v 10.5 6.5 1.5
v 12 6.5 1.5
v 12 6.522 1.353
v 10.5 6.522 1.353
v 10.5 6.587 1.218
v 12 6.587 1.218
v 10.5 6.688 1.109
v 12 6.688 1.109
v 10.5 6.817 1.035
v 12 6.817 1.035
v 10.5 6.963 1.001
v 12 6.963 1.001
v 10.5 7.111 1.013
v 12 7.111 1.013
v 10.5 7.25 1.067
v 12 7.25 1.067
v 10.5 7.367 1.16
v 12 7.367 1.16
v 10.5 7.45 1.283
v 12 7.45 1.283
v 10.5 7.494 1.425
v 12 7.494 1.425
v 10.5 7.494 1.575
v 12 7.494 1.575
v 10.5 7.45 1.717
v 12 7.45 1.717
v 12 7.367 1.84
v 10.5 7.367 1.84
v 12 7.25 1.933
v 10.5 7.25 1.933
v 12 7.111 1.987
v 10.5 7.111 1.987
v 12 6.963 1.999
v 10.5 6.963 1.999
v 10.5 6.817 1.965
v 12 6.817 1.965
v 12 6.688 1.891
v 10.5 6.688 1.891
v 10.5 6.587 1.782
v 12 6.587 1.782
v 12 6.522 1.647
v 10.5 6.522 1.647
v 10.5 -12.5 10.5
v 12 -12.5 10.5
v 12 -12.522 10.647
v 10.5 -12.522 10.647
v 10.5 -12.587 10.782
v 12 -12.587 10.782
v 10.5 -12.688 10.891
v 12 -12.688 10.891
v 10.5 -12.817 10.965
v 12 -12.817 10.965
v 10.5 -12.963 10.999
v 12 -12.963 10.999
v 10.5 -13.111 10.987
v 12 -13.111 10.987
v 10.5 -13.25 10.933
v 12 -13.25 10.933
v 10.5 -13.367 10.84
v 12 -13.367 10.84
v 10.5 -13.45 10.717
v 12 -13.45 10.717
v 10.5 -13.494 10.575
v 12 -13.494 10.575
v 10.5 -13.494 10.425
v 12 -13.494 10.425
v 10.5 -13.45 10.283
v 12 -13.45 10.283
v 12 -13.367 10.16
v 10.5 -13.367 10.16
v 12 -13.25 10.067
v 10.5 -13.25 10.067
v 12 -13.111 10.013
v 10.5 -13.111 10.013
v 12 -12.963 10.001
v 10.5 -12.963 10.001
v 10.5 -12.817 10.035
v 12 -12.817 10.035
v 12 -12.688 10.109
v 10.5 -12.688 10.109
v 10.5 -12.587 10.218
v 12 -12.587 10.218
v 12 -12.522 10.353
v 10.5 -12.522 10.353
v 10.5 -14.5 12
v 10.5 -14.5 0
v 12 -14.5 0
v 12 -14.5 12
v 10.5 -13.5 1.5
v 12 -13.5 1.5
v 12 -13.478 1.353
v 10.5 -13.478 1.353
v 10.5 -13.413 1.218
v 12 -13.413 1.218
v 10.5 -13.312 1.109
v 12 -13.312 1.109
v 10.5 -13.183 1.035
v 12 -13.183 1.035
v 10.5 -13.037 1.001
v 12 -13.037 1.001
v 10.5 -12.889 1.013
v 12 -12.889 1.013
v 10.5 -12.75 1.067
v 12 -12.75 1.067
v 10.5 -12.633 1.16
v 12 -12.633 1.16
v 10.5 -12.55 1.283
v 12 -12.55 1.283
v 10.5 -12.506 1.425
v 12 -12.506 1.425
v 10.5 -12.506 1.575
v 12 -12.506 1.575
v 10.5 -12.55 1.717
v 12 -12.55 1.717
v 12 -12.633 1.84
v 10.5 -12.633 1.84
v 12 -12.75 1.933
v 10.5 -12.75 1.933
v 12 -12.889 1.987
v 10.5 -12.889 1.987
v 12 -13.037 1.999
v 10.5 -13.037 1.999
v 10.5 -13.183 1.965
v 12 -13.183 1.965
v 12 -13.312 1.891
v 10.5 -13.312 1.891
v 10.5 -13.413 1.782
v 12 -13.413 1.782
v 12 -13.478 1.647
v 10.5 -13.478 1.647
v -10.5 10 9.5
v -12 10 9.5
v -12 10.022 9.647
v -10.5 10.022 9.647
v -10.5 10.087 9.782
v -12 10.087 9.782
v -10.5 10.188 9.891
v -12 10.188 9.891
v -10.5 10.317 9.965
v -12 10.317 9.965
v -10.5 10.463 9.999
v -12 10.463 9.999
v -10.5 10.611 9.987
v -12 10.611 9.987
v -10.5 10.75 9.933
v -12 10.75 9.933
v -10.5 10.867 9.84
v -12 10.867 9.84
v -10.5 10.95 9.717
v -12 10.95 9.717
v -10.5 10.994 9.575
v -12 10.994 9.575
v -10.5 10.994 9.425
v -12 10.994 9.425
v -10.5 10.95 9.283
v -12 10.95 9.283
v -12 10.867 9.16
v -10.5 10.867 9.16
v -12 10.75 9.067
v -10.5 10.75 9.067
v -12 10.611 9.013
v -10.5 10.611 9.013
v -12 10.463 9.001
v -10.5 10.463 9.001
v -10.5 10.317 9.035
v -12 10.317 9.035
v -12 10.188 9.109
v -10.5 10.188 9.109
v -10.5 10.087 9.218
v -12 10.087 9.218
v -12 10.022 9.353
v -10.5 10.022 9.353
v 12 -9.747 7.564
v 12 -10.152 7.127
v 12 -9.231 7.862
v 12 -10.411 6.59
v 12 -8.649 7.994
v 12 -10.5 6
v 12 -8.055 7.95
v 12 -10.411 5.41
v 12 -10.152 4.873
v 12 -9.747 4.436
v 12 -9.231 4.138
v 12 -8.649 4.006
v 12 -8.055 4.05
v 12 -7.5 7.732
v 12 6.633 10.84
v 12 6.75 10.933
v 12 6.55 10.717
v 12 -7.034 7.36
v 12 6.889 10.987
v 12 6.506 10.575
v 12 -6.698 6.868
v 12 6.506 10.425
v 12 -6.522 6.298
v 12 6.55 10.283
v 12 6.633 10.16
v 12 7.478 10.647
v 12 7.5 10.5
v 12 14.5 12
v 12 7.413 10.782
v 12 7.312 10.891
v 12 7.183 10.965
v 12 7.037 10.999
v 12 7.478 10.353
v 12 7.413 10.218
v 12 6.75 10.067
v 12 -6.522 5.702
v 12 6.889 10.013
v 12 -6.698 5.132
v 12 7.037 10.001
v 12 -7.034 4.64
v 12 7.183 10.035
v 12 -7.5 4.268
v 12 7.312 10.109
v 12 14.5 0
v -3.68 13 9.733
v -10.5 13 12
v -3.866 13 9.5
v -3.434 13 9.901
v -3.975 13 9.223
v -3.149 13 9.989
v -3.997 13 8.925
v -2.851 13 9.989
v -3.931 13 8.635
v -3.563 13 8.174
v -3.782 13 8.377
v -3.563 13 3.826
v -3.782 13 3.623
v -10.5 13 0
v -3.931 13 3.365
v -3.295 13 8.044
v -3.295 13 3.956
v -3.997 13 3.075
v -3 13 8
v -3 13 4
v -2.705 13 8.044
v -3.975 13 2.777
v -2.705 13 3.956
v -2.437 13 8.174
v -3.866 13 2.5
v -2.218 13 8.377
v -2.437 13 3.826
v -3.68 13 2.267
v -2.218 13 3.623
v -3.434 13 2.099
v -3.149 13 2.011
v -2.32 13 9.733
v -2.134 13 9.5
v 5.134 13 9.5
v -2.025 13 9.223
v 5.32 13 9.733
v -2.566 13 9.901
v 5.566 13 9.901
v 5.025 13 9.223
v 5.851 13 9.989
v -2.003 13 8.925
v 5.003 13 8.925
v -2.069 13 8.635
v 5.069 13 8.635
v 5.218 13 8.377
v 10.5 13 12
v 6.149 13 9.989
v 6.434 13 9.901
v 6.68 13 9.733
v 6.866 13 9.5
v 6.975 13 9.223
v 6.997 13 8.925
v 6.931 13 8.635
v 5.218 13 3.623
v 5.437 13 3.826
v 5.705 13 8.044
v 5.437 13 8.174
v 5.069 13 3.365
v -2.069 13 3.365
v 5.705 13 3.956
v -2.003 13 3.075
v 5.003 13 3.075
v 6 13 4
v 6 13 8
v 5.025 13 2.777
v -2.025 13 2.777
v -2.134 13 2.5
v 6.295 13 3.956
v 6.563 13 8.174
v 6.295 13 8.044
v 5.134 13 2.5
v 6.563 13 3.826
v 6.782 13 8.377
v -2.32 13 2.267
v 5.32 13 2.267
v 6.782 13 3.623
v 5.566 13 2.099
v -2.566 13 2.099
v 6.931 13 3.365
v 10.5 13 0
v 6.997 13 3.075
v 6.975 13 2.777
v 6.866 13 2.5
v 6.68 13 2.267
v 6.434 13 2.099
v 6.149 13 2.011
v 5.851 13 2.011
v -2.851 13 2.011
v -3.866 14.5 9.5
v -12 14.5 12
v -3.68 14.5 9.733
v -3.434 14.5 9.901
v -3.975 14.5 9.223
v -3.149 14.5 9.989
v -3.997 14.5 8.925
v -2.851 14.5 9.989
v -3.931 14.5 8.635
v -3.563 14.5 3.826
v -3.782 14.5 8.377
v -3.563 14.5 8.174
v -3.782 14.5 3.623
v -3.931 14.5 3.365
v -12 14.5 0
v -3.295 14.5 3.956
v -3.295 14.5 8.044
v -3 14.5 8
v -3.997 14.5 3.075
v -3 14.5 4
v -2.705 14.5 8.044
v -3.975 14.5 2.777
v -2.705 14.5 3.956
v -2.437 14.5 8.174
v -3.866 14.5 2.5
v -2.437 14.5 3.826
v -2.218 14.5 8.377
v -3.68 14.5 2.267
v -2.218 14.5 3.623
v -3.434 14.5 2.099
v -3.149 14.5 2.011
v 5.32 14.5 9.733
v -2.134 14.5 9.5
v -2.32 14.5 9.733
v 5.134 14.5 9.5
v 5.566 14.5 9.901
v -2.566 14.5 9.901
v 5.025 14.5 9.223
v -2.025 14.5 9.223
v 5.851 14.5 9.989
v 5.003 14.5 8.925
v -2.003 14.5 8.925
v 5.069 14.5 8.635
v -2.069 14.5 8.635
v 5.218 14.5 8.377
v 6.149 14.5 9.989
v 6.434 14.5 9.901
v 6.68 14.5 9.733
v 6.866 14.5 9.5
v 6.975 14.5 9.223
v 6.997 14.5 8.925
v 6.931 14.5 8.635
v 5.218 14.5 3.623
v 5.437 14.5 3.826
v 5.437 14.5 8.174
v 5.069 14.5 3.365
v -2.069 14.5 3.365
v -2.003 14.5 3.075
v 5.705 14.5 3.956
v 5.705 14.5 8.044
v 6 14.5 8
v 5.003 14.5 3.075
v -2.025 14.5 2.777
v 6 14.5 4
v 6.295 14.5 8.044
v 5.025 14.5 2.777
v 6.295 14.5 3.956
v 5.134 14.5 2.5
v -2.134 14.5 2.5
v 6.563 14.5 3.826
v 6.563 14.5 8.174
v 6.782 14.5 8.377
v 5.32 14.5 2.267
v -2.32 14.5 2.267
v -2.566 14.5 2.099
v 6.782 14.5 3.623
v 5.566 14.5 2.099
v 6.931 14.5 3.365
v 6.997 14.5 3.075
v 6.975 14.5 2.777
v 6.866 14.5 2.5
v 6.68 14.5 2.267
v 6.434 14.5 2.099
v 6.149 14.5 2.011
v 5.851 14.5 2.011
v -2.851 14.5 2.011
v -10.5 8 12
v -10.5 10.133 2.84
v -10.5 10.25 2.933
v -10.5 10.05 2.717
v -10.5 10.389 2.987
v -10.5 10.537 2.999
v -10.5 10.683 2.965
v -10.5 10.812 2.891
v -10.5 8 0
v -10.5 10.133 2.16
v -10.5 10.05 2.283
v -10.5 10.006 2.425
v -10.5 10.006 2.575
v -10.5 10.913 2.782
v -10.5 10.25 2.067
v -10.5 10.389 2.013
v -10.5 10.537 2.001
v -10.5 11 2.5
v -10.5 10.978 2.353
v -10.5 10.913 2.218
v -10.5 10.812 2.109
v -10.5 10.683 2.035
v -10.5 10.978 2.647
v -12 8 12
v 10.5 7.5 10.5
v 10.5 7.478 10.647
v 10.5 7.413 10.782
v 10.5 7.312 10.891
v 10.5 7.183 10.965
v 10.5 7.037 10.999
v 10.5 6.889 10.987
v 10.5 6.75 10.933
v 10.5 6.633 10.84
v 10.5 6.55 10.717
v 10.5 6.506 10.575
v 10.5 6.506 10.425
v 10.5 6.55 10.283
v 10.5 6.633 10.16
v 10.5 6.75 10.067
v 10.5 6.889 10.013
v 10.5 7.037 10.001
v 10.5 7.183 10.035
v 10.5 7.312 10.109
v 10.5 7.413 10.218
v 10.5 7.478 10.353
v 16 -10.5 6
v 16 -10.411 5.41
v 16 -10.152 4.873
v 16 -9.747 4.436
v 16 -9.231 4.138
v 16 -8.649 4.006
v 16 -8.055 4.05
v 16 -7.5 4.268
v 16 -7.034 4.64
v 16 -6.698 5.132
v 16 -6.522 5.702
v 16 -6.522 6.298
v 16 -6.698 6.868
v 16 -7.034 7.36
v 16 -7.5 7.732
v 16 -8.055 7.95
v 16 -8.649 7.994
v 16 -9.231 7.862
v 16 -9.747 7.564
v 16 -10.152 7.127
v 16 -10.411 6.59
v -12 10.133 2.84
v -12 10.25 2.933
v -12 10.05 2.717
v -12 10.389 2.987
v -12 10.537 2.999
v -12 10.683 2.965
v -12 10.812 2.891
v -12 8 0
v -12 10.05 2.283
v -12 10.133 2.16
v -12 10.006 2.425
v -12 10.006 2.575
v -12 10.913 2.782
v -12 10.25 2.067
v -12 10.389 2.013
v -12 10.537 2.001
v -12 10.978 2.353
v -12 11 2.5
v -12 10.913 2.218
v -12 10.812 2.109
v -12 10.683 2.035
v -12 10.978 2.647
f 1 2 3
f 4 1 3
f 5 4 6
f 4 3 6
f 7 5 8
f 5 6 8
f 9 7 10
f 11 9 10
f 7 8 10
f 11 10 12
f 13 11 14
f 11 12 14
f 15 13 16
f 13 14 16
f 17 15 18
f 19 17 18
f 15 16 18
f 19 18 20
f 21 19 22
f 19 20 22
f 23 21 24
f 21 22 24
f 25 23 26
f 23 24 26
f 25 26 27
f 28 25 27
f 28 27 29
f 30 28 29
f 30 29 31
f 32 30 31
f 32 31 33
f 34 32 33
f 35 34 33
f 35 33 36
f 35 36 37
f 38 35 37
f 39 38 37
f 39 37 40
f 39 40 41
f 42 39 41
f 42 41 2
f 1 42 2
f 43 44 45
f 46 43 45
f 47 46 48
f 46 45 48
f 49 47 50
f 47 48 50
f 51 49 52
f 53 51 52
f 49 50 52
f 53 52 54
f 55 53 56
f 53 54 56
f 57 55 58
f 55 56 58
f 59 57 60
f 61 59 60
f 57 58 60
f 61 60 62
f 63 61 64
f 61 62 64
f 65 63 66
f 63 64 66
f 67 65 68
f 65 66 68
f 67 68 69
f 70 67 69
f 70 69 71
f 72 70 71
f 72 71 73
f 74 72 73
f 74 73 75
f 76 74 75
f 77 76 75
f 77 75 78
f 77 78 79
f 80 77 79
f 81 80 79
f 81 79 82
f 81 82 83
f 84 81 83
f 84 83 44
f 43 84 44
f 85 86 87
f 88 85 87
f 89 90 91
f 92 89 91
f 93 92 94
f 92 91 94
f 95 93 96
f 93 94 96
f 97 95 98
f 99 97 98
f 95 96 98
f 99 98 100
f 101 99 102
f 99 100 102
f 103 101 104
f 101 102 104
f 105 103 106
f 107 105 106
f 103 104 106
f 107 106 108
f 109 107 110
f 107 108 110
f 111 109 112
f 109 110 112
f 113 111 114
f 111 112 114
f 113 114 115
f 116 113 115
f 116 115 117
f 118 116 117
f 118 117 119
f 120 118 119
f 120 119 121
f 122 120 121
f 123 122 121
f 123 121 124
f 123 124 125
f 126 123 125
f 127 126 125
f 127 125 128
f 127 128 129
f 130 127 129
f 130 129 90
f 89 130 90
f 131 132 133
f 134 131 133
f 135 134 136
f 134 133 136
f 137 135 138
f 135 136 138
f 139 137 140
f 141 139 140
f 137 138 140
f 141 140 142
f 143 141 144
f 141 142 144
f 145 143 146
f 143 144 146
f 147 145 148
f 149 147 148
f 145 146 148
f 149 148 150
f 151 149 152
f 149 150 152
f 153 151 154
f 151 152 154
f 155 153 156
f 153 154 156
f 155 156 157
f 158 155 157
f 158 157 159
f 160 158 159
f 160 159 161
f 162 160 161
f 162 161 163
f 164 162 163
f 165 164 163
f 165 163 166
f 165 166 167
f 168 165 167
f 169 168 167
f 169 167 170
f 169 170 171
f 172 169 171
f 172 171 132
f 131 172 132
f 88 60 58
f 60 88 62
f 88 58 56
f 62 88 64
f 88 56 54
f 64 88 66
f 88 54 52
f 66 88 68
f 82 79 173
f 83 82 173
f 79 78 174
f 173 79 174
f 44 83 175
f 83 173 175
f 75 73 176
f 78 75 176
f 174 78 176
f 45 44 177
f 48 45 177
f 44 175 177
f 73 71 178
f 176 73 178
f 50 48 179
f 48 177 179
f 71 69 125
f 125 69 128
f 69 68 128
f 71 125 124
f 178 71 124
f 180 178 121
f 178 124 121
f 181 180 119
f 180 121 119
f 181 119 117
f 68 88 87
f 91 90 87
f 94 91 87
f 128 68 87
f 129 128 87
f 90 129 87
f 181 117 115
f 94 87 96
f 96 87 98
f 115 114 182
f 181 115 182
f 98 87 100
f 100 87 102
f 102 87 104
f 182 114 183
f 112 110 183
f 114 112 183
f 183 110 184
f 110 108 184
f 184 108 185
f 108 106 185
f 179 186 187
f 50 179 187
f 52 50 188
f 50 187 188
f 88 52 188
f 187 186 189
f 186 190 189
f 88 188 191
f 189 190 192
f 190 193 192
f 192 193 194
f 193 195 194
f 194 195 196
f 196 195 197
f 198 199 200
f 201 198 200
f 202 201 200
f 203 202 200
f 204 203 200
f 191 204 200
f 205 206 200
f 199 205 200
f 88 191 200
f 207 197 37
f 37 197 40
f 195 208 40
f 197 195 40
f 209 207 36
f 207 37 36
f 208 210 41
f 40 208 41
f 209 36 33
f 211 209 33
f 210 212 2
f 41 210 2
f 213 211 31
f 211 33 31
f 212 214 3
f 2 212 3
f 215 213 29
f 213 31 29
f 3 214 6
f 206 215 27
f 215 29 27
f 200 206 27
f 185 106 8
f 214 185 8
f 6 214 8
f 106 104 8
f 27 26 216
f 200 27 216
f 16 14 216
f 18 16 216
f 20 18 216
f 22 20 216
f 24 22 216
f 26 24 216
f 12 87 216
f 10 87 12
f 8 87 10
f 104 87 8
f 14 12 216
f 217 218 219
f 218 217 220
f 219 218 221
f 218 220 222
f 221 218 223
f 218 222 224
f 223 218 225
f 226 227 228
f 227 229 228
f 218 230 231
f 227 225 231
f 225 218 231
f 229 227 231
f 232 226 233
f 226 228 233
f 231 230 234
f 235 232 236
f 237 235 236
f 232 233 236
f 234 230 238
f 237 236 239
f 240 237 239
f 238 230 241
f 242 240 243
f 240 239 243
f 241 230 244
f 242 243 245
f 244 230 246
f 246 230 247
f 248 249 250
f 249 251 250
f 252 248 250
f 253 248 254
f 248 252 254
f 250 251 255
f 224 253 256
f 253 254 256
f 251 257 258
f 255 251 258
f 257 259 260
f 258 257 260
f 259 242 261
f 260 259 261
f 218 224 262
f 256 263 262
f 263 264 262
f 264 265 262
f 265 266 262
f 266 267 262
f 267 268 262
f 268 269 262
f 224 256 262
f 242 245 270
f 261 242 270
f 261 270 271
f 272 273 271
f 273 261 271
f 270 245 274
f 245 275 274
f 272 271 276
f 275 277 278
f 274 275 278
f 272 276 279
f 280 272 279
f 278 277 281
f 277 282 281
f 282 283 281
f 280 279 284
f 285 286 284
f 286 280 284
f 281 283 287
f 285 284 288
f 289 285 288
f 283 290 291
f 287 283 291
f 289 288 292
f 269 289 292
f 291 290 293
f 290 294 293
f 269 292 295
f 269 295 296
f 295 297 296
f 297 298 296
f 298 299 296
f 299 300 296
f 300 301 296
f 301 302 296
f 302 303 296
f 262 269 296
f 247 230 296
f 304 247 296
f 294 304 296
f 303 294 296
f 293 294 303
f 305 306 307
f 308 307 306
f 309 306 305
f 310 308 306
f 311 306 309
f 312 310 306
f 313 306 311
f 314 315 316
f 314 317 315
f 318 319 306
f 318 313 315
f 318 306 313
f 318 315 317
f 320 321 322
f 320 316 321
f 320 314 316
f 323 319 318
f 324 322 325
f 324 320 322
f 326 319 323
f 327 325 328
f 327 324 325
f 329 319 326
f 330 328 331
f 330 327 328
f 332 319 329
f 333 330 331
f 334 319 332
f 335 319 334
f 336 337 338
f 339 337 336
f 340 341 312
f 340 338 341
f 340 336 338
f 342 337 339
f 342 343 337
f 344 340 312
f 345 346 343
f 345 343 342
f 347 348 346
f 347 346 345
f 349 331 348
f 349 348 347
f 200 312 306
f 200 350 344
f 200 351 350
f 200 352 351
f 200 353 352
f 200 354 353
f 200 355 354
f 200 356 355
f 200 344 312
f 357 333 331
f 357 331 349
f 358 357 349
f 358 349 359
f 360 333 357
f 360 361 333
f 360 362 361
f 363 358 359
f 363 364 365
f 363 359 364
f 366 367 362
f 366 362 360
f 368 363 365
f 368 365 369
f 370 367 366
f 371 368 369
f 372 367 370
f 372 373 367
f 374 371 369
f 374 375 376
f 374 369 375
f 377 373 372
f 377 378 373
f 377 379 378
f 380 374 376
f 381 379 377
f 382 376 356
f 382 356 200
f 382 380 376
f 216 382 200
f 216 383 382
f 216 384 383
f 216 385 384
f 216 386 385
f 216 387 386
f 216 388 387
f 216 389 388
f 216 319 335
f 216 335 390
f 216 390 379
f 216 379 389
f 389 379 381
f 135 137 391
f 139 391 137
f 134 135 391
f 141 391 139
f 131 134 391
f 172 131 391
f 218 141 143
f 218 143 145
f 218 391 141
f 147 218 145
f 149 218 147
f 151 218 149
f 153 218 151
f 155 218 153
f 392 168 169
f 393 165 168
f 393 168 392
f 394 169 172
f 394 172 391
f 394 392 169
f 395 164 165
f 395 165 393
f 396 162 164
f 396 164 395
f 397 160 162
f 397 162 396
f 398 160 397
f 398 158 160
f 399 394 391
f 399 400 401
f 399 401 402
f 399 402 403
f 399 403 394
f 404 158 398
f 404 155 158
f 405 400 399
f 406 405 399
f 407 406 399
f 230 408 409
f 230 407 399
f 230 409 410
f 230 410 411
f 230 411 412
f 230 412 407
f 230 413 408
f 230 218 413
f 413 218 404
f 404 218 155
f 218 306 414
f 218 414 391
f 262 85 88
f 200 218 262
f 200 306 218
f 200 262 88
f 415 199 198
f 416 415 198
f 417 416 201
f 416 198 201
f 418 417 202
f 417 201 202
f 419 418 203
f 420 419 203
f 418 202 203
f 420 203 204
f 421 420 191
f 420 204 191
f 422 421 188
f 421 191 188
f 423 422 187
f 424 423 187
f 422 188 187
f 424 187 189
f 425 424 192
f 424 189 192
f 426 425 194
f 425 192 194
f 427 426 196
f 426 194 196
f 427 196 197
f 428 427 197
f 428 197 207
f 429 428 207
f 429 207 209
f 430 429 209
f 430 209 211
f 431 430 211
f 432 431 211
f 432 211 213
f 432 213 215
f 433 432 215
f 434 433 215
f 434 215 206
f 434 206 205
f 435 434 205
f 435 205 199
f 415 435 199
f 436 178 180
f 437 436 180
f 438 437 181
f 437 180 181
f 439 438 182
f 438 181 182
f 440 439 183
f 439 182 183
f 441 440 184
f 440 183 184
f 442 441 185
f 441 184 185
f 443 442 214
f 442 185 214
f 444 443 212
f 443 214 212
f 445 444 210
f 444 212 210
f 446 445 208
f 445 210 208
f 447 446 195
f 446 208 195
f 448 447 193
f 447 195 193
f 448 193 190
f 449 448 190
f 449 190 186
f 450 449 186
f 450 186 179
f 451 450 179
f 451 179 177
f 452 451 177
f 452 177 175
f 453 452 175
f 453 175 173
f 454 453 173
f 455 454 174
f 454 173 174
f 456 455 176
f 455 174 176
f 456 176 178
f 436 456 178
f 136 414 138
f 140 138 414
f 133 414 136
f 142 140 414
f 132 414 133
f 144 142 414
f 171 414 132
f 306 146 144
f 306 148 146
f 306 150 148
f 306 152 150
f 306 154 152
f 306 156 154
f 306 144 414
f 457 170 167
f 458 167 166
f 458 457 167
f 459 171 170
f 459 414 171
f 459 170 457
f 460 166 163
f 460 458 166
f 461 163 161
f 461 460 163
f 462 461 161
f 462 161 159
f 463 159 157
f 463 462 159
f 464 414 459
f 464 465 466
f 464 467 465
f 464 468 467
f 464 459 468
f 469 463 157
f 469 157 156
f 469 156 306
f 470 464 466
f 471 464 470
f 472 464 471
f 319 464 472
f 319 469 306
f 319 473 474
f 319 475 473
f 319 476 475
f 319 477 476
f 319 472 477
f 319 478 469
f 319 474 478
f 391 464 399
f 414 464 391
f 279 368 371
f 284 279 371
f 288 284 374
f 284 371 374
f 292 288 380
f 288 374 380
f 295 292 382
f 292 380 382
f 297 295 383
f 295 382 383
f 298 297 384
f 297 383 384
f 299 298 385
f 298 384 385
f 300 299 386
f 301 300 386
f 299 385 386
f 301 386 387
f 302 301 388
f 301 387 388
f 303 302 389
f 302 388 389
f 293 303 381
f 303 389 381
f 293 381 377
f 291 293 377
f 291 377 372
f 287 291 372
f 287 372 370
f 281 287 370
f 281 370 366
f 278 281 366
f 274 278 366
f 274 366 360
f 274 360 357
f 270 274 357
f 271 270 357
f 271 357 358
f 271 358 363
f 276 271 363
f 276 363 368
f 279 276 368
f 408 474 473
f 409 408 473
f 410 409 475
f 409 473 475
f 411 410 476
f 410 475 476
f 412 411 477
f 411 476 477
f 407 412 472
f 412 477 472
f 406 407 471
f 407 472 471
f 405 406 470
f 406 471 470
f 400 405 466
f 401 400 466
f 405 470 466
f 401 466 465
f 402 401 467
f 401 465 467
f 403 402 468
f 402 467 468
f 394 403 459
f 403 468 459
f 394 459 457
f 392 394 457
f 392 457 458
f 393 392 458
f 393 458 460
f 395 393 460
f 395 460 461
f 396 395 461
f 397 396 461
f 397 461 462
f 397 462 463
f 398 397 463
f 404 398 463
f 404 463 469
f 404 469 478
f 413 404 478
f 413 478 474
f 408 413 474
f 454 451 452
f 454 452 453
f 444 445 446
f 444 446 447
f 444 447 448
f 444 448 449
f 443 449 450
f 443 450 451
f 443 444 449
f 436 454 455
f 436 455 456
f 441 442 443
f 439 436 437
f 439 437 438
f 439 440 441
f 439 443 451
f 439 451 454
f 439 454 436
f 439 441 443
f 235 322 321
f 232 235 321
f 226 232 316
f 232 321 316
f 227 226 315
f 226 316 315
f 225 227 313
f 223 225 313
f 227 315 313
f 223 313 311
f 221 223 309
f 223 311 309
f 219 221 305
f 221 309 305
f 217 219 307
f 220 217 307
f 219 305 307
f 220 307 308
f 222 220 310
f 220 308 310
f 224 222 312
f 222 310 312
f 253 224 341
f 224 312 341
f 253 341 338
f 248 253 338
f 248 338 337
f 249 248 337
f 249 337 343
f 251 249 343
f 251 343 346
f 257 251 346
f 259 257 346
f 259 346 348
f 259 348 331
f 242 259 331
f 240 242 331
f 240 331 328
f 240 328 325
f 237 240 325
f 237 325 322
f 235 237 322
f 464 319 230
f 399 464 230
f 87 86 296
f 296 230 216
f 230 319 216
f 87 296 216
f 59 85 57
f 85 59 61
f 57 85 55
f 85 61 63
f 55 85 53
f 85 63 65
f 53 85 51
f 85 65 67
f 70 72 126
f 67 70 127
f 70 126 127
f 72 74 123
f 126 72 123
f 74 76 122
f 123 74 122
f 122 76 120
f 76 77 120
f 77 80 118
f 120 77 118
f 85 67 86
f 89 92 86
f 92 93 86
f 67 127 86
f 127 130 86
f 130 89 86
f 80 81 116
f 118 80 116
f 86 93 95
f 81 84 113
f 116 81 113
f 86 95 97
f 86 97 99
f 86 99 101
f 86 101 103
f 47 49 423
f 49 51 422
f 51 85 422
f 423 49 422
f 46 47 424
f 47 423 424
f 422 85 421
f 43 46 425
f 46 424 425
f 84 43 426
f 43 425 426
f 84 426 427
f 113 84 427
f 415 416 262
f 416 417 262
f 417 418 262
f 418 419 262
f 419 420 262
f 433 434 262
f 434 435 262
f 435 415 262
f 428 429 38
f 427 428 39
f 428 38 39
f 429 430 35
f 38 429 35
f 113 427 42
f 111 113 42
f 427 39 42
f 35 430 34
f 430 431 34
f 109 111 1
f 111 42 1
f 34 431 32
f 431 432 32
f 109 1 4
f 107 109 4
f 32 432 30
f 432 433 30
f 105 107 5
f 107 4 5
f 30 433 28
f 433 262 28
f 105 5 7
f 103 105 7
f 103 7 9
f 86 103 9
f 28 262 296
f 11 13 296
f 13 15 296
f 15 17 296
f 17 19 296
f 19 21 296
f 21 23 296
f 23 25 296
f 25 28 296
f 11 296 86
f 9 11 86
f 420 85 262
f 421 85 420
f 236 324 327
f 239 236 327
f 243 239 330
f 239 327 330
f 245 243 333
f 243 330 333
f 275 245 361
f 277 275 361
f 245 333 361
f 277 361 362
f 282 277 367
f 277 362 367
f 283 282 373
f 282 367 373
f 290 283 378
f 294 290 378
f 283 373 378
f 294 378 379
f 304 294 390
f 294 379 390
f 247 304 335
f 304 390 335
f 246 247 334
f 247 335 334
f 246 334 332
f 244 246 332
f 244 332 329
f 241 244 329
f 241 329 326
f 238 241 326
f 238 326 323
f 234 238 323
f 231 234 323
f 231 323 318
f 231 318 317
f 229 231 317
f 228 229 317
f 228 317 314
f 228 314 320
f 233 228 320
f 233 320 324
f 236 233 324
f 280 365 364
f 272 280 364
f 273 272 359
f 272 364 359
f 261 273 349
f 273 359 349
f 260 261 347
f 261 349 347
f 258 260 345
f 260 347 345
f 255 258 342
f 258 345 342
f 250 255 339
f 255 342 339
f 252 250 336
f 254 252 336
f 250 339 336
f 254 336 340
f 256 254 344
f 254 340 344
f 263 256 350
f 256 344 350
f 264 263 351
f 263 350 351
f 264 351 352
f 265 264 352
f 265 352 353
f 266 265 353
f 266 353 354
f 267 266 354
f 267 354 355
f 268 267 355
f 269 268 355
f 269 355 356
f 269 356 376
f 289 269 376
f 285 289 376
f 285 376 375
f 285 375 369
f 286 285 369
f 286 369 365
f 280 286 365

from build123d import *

# Parameters (mm, degrees)
SKETCH1_W           = 24
SKETCH1_H           = 29
SKETCH1_W_2         = 21
SKETCH1_H_2         = 26
BOSS_EXTRUDE1_DEPTH = 12
SKETCH2_W           = 21
SKETCH2_H           = 12
CUT_EXTRUDE1_DEPTH  = 33.314857264
SKETCH4_W           = 12
SKETCH4_H           = 22.5
CUT_EXTRUDE2_DEPTH  = 12
SKETCH5_R           = 0.5
CUT_EXTRUDE3_DEPTH  = 12
SKETCH6_R           = 0.5
CUT_EXTRUDE4_DEPTH  = 12
SKETCH7_R           = 2
BOSS_EXTRUDE2_DEPTH = 4
SKETCH9_R           = 1
CUT_EXTRUDE5_DEPTH  = 10


with BuildPart() as part:
    # Sketch1 → Boss-Extrude1 (new body)
    with BuildSketch(Plane.XY):
        Rectangle(SKETCH1_W, SKETCH1_H)
        Rectangle(SKETCH1_W_2, SKETCH1_H_2, mode=Mode.SUBTRACT)
    extrude(amount=BOSS_EXTRUDE1_DEPTH)

    # Sketch2 → Cut-Extrude1 (cut, through all)
    with BuildSketch(Plane(origin=(0, -13, 0), x_dir=(1, 0, 0), z_dir=(0, 1, 0))):
        with Locations((0, -6)):
            Rectangle(SKETCH2_W, SKETCH2_H)
    extrude(amount=-CUT_EXTRUDE1_DEPTH, mode=Mode.SUBTRACT)

    # Sketch4 → Cut-Extrude2 (cut)
    with BuildSketch(Plane.ZY.offset(12)):
        with Locations((6, -3.25)):
            Rectangle(SKETCH4_W, SKETCH4_H)
    extrude(amount=-CUT_EXTRUDE2_DEPTH, mode=Mode.SUBTRACT)

    # Sketch5 → Cut-Extrude3 (cut)
    with BuildSketch(Plane(origin=(12, 0, 0), x_dir=(0, 0, -1), z_dir=(1, 0, 0))):
        with Locations(Location((-10.5, -13, 0), (0, 0, 90))):
            Circle(SKETCH5_R)
        with Locations(Location((-1.5, -13, 0), (0, 0, 270))):
            Circle(SKETCH5_R)
        with Locations(Location((-10.5, 7, 0), (0, 0, 90))):
            Circle(SKETCH5_R)
        with Locations(Location((-1.5, 7, 0), (0, 0, 270))):
            Circle(SKETCH5_R)
    extrude(amount=-CUT_EXTRUDE3_DEPTH, mode=Mode.SUBTRACT)

    # Sketch6 → Cut-Extrude4 (cut)
    with BuildSketch(Plane.ZY.offset(12)):
        with Locations(Location((9.5, 10.5, 0), (0, 0, 270))):
            Circle(SKETCH6_R)
        with Locations(Location((2.5, 10.5, 0), (0, 0, 90))):
            Circle(SKETCH6_R)
    extrude(amount=-CUT_EXTRUDE4_DEPTH, mode=Mode.SUBTRACT)

    # Sketch7 → Boss-Extrude2 (add)
    with BuildSketch(Plane(origin=(12, 0, 0), x_dir=(0, 0, -1), z_dir=(1, 0, 0))):
        with Locations(Location((-6, -8.5, 0), (0, 0, 270))):
            Circle(SKETCH7_R)
    extrude(amount=BOSS_EXTRUDE2_DEPTH)

    # Sketch9 → Cut-Extrude5 (cut)
    with BuildSketch(Plane(origin=(0, 14.5, 0), x_dir=(1, 0, 0), z_dir=(0, 1, 0))):
        with Locations(Location((6, -3, 0), (0, 0, 270))):
            Circle(SKETCH9_R)
        with Locations(Location((6, -9, 0), (0, 0, 90))):
            Circle(SKETCH9_R)
        with Locations(Location((-3, -3, 0), (0, 0, 270))):
            Circle(SKETCH9_R)
        with Locations(Location((-3, -9, 0), (0, 0, 90))):
            Circle(SKETCH9_R)
    extrude(amount=-CUT_EXTRUDE5_DEPTH, mode=Mode.SUBTRACT)


solid = part.part
